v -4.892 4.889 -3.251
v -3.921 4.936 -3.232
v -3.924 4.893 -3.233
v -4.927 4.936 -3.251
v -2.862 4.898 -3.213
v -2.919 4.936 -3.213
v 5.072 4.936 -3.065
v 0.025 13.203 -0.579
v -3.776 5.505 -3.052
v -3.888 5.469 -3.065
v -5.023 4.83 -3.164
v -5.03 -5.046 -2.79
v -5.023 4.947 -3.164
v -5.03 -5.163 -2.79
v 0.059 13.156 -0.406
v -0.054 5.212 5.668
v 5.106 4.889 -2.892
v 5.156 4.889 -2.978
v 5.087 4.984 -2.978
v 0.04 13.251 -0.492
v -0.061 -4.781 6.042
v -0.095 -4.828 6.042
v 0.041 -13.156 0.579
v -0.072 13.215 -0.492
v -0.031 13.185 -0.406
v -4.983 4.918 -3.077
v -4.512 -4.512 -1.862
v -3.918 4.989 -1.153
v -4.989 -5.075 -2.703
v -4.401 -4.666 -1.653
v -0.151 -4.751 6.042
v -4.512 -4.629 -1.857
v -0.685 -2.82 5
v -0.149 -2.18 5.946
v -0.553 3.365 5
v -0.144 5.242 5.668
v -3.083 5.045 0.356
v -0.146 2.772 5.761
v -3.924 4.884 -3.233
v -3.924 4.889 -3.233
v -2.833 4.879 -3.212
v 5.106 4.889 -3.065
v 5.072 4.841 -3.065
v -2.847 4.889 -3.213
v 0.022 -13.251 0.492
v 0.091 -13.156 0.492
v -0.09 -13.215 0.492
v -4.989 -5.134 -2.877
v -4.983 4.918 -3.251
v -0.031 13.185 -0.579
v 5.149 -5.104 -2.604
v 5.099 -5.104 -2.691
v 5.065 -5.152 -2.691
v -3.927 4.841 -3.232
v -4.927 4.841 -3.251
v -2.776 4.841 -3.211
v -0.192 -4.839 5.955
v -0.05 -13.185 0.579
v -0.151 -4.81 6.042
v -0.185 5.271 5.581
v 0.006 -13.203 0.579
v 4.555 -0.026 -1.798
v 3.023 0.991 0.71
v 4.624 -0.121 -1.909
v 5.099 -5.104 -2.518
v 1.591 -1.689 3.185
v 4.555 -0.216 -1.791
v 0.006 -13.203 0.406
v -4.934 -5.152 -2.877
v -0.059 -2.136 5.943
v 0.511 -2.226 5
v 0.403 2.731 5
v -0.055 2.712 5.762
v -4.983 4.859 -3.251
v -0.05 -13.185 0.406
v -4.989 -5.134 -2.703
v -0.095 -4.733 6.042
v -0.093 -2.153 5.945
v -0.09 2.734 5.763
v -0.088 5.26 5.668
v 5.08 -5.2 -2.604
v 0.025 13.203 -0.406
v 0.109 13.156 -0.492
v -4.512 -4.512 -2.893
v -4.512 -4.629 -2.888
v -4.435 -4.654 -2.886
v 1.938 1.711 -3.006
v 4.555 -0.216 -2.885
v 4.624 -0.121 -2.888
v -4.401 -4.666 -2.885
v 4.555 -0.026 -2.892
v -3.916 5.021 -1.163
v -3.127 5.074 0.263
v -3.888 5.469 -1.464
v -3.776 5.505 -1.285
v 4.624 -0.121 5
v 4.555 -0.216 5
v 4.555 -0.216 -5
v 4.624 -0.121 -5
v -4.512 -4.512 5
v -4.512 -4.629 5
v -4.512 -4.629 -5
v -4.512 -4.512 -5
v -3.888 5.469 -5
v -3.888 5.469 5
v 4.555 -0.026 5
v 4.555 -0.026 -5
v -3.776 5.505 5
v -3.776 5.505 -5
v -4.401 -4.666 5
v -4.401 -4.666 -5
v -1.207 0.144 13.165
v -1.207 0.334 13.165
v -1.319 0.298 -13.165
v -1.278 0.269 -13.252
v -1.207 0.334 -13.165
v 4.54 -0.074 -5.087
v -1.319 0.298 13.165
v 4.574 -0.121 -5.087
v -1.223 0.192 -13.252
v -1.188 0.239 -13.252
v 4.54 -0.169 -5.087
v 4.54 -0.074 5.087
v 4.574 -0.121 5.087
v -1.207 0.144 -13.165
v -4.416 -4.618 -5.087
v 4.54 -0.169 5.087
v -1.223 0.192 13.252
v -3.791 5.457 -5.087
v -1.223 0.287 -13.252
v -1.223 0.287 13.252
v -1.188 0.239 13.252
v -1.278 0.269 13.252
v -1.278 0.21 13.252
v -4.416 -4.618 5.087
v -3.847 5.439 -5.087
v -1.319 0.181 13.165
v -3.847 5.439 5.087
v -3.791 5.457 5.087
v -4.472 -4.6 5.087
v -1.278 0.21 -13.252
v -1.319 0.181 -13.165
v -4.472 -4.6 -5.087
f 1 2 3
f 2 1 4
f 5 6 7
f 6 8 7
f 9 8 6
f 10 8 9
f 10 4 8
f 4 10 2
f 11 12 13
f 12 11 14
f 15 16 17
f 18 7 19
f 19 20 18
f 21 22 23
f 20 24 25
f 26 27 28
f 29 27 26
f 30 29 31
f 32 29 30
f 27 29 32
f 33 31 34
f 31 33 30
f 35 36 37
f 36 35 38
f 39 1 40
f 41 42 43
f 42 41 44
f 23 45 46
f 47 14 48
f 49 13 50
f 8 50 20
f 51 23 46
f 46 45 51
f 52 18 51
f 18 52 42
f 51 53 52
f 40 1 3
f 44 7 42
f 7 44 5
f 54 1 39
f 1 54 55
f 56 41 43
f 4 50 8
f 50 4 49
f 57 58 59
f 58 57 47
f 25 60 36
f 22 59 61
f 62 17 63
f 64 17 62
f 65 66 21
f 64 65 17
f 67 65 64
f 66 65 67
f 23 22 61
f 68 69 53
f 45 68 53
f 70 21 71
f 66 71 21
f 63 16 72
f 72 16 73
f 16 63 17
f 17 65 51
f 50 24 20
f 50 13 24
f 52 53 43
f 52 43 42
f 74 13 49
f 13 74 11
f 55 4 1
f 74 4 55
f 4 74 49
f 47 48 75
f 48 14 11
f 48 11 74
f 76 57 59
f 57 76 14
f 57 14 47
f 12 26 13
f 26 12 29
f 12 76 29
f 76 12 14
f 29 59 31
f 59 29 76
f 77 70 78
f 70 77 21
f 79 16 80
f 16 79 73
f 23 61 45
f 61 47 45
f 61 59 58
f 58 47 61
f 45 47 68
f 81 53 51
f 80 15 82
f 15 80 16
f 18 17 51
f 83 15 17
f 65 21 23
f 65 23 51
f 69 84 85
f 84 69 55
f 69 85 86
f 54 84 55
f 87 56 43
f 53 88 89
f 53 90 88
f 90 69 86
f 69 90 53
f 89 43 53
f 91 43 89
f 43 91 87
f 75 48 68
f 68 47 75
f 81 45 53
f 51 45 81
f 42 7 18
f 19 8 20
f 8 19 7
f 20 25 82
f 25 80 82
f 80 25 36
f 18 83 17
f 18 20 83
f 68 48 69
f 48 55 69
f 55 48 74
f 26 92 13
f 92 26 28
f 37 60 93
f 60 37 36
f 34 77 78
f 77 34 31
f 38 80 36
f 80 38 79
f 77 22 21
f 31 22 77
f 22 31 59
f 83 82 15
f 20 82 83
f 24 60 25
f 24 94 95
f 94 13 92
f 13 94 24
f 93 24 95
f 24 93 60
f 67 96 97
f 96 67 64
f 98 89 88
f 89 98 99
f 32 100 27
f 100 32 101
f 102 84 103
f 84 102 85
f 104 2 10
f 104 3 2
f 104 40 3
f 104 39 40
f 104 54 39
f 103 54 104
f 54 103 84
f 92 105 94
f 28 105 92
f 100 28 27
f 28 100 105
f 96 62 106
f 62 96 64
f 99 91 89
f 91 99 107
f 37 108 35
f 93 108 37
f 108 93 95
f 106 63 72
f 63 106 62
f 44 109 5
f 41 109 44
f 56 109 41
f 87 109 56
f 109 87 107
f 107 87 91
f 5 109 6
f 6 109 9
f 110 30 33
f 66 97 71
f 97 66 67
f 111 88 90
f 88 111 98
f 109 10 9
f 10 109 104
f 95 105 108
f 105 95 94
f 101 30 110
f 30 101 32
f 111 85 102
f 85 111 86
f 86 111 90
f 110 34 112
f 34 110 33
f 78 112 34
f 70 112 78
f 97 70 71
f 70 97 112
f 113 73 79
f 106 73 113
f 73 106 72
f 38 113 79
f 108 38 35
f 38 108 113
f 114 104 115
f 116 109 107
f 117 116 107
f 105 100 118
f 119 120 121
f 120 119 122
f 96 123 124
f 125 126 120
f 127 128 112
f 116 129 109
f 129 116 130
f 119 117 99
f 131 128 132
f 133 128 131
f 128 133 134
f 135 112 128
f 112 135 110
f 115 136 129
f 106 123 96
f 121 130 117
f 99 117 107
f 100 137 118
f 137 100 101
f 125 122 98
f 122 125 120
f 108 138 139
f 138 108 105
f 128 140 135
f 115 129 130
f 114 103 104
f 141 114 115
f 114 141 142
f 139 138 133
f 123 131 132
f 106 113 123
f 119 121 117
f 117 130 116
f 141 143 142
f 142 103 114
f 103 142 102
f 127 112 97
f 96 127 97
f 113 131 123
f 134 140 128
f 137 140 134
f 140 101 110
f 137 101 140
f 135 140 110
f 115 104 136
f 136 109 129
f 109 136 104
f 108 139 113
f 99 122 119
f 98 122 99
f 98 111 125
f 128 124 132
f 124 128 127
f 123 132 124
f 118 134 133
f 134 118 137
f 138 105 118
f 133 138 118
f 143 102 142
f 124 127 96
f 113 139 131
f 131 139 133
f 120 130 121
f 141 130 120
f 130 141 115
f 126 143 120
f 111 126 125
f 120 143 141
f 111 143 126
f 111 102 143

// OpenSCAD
// Auto-generated OpenSCAD file

    inner_points = 10*[[-0.4431428263878504, -0.4570616481590885, 0.5000000000000111], [-0.4431428263878677, -0.4570616481591002, -0.49999999999998884], [-0.38067743121914766, 0.5409854821941918, 0.4999999999999984], [-0.3806774312191651, 0.5409854821941802, -0.5000000000000016], [0.452424040256601, -0.012134702055978608, 0.49999999999999045], [0.45242404025658345, -0.012134702055990293, -0.5000000000000095], [-0.12379873911678495, 0.023929710659717798, 1.316496580927726], [-0.12379873911683055, 0.023929710659686996, -1.316496580927726]];

    outer_points = 10*[[-0.49420916328855335, 0.48885165398079056, -0.3164090653808874], [-0.4949038486176348, -0.5104484675685688, -0.27900873805973586], [0.505618378810838, 0.48885165398079056, -0.2978379571886004], [0.5049236934817566, -0.5104484675685688, -0.26043762986744884], [-0.01036718752866248, 0.5212468743624579, 0.5581465315877604], [-0.011061872857743975, -0.4780532471869015, 0.5955468589089121], [0.0009145508605564383, 1.3155751933403925, -0.0492374030438739], [-0.0009145508605564383, -1.3155751933403925, 0.0492374030438739]];

    // Convex hull for inner set (I)
    module inner_hull() {
        hull() {
            for (p = inner_points) {
                translate(p) sphere(r=0.1);
            }
        }
    }

    // Convex hull for outer set (O) minus inner hull (O \ I)
    module outer_minus_inner() {
        difference() {
            hull() {
                for (p = outer_points) {
                    translate(p) sphere(r=0.1);
                }
            }
            inner_hull(); // Subtract inner hull
        }
    }

    // Convex hull for outer set (O) minus all translated inner hulls
    module outer_minus_AllTranslationInner() {
        difference() {
            hull() {
                for (p = outer_points) {
                    translate(p) sphere(r=0.1);
                }
            }
            hull() {
                translate([0,0,50]) inner_hull();
                translate([0,0,-50]) inner_hull();
            }; // Subtract translated inner hulls
        }
    }

    // Difference between outer_minus_inner and outer_minus_AllTranslationInner
    module outer_minus_inner_diff() {
        difference() {
            // Outer minus inner
            difference() {
                hull() {
                    for (p = outer_points) {
                        translate(p) sphere(r=0.1);
                    }
                }
                inner_hull();
            }

            // Subtract Outer minus AllTranslationInner
            difference() {
                hull() {
                    for (p = outer_points) {
                        translate(p) sphere(r=0.1);
                    }
                }
                hull() {
                    translate([0,0,50]) inner_hull();
                    translate([0,0,-50]) inner_hull();
                };
            }
        }
    }

    // Rendering all with colors applied
    color([1, 0, 0, 0.5]) inner_hull(); // Transparent red
    color([0, 1, 0, 1]) outer_minus_AllTranslationInner(); // Opaque green
    color([1, 1, 0, 1]) outer_minus_inner_diff(); // Opaque yellow
    
